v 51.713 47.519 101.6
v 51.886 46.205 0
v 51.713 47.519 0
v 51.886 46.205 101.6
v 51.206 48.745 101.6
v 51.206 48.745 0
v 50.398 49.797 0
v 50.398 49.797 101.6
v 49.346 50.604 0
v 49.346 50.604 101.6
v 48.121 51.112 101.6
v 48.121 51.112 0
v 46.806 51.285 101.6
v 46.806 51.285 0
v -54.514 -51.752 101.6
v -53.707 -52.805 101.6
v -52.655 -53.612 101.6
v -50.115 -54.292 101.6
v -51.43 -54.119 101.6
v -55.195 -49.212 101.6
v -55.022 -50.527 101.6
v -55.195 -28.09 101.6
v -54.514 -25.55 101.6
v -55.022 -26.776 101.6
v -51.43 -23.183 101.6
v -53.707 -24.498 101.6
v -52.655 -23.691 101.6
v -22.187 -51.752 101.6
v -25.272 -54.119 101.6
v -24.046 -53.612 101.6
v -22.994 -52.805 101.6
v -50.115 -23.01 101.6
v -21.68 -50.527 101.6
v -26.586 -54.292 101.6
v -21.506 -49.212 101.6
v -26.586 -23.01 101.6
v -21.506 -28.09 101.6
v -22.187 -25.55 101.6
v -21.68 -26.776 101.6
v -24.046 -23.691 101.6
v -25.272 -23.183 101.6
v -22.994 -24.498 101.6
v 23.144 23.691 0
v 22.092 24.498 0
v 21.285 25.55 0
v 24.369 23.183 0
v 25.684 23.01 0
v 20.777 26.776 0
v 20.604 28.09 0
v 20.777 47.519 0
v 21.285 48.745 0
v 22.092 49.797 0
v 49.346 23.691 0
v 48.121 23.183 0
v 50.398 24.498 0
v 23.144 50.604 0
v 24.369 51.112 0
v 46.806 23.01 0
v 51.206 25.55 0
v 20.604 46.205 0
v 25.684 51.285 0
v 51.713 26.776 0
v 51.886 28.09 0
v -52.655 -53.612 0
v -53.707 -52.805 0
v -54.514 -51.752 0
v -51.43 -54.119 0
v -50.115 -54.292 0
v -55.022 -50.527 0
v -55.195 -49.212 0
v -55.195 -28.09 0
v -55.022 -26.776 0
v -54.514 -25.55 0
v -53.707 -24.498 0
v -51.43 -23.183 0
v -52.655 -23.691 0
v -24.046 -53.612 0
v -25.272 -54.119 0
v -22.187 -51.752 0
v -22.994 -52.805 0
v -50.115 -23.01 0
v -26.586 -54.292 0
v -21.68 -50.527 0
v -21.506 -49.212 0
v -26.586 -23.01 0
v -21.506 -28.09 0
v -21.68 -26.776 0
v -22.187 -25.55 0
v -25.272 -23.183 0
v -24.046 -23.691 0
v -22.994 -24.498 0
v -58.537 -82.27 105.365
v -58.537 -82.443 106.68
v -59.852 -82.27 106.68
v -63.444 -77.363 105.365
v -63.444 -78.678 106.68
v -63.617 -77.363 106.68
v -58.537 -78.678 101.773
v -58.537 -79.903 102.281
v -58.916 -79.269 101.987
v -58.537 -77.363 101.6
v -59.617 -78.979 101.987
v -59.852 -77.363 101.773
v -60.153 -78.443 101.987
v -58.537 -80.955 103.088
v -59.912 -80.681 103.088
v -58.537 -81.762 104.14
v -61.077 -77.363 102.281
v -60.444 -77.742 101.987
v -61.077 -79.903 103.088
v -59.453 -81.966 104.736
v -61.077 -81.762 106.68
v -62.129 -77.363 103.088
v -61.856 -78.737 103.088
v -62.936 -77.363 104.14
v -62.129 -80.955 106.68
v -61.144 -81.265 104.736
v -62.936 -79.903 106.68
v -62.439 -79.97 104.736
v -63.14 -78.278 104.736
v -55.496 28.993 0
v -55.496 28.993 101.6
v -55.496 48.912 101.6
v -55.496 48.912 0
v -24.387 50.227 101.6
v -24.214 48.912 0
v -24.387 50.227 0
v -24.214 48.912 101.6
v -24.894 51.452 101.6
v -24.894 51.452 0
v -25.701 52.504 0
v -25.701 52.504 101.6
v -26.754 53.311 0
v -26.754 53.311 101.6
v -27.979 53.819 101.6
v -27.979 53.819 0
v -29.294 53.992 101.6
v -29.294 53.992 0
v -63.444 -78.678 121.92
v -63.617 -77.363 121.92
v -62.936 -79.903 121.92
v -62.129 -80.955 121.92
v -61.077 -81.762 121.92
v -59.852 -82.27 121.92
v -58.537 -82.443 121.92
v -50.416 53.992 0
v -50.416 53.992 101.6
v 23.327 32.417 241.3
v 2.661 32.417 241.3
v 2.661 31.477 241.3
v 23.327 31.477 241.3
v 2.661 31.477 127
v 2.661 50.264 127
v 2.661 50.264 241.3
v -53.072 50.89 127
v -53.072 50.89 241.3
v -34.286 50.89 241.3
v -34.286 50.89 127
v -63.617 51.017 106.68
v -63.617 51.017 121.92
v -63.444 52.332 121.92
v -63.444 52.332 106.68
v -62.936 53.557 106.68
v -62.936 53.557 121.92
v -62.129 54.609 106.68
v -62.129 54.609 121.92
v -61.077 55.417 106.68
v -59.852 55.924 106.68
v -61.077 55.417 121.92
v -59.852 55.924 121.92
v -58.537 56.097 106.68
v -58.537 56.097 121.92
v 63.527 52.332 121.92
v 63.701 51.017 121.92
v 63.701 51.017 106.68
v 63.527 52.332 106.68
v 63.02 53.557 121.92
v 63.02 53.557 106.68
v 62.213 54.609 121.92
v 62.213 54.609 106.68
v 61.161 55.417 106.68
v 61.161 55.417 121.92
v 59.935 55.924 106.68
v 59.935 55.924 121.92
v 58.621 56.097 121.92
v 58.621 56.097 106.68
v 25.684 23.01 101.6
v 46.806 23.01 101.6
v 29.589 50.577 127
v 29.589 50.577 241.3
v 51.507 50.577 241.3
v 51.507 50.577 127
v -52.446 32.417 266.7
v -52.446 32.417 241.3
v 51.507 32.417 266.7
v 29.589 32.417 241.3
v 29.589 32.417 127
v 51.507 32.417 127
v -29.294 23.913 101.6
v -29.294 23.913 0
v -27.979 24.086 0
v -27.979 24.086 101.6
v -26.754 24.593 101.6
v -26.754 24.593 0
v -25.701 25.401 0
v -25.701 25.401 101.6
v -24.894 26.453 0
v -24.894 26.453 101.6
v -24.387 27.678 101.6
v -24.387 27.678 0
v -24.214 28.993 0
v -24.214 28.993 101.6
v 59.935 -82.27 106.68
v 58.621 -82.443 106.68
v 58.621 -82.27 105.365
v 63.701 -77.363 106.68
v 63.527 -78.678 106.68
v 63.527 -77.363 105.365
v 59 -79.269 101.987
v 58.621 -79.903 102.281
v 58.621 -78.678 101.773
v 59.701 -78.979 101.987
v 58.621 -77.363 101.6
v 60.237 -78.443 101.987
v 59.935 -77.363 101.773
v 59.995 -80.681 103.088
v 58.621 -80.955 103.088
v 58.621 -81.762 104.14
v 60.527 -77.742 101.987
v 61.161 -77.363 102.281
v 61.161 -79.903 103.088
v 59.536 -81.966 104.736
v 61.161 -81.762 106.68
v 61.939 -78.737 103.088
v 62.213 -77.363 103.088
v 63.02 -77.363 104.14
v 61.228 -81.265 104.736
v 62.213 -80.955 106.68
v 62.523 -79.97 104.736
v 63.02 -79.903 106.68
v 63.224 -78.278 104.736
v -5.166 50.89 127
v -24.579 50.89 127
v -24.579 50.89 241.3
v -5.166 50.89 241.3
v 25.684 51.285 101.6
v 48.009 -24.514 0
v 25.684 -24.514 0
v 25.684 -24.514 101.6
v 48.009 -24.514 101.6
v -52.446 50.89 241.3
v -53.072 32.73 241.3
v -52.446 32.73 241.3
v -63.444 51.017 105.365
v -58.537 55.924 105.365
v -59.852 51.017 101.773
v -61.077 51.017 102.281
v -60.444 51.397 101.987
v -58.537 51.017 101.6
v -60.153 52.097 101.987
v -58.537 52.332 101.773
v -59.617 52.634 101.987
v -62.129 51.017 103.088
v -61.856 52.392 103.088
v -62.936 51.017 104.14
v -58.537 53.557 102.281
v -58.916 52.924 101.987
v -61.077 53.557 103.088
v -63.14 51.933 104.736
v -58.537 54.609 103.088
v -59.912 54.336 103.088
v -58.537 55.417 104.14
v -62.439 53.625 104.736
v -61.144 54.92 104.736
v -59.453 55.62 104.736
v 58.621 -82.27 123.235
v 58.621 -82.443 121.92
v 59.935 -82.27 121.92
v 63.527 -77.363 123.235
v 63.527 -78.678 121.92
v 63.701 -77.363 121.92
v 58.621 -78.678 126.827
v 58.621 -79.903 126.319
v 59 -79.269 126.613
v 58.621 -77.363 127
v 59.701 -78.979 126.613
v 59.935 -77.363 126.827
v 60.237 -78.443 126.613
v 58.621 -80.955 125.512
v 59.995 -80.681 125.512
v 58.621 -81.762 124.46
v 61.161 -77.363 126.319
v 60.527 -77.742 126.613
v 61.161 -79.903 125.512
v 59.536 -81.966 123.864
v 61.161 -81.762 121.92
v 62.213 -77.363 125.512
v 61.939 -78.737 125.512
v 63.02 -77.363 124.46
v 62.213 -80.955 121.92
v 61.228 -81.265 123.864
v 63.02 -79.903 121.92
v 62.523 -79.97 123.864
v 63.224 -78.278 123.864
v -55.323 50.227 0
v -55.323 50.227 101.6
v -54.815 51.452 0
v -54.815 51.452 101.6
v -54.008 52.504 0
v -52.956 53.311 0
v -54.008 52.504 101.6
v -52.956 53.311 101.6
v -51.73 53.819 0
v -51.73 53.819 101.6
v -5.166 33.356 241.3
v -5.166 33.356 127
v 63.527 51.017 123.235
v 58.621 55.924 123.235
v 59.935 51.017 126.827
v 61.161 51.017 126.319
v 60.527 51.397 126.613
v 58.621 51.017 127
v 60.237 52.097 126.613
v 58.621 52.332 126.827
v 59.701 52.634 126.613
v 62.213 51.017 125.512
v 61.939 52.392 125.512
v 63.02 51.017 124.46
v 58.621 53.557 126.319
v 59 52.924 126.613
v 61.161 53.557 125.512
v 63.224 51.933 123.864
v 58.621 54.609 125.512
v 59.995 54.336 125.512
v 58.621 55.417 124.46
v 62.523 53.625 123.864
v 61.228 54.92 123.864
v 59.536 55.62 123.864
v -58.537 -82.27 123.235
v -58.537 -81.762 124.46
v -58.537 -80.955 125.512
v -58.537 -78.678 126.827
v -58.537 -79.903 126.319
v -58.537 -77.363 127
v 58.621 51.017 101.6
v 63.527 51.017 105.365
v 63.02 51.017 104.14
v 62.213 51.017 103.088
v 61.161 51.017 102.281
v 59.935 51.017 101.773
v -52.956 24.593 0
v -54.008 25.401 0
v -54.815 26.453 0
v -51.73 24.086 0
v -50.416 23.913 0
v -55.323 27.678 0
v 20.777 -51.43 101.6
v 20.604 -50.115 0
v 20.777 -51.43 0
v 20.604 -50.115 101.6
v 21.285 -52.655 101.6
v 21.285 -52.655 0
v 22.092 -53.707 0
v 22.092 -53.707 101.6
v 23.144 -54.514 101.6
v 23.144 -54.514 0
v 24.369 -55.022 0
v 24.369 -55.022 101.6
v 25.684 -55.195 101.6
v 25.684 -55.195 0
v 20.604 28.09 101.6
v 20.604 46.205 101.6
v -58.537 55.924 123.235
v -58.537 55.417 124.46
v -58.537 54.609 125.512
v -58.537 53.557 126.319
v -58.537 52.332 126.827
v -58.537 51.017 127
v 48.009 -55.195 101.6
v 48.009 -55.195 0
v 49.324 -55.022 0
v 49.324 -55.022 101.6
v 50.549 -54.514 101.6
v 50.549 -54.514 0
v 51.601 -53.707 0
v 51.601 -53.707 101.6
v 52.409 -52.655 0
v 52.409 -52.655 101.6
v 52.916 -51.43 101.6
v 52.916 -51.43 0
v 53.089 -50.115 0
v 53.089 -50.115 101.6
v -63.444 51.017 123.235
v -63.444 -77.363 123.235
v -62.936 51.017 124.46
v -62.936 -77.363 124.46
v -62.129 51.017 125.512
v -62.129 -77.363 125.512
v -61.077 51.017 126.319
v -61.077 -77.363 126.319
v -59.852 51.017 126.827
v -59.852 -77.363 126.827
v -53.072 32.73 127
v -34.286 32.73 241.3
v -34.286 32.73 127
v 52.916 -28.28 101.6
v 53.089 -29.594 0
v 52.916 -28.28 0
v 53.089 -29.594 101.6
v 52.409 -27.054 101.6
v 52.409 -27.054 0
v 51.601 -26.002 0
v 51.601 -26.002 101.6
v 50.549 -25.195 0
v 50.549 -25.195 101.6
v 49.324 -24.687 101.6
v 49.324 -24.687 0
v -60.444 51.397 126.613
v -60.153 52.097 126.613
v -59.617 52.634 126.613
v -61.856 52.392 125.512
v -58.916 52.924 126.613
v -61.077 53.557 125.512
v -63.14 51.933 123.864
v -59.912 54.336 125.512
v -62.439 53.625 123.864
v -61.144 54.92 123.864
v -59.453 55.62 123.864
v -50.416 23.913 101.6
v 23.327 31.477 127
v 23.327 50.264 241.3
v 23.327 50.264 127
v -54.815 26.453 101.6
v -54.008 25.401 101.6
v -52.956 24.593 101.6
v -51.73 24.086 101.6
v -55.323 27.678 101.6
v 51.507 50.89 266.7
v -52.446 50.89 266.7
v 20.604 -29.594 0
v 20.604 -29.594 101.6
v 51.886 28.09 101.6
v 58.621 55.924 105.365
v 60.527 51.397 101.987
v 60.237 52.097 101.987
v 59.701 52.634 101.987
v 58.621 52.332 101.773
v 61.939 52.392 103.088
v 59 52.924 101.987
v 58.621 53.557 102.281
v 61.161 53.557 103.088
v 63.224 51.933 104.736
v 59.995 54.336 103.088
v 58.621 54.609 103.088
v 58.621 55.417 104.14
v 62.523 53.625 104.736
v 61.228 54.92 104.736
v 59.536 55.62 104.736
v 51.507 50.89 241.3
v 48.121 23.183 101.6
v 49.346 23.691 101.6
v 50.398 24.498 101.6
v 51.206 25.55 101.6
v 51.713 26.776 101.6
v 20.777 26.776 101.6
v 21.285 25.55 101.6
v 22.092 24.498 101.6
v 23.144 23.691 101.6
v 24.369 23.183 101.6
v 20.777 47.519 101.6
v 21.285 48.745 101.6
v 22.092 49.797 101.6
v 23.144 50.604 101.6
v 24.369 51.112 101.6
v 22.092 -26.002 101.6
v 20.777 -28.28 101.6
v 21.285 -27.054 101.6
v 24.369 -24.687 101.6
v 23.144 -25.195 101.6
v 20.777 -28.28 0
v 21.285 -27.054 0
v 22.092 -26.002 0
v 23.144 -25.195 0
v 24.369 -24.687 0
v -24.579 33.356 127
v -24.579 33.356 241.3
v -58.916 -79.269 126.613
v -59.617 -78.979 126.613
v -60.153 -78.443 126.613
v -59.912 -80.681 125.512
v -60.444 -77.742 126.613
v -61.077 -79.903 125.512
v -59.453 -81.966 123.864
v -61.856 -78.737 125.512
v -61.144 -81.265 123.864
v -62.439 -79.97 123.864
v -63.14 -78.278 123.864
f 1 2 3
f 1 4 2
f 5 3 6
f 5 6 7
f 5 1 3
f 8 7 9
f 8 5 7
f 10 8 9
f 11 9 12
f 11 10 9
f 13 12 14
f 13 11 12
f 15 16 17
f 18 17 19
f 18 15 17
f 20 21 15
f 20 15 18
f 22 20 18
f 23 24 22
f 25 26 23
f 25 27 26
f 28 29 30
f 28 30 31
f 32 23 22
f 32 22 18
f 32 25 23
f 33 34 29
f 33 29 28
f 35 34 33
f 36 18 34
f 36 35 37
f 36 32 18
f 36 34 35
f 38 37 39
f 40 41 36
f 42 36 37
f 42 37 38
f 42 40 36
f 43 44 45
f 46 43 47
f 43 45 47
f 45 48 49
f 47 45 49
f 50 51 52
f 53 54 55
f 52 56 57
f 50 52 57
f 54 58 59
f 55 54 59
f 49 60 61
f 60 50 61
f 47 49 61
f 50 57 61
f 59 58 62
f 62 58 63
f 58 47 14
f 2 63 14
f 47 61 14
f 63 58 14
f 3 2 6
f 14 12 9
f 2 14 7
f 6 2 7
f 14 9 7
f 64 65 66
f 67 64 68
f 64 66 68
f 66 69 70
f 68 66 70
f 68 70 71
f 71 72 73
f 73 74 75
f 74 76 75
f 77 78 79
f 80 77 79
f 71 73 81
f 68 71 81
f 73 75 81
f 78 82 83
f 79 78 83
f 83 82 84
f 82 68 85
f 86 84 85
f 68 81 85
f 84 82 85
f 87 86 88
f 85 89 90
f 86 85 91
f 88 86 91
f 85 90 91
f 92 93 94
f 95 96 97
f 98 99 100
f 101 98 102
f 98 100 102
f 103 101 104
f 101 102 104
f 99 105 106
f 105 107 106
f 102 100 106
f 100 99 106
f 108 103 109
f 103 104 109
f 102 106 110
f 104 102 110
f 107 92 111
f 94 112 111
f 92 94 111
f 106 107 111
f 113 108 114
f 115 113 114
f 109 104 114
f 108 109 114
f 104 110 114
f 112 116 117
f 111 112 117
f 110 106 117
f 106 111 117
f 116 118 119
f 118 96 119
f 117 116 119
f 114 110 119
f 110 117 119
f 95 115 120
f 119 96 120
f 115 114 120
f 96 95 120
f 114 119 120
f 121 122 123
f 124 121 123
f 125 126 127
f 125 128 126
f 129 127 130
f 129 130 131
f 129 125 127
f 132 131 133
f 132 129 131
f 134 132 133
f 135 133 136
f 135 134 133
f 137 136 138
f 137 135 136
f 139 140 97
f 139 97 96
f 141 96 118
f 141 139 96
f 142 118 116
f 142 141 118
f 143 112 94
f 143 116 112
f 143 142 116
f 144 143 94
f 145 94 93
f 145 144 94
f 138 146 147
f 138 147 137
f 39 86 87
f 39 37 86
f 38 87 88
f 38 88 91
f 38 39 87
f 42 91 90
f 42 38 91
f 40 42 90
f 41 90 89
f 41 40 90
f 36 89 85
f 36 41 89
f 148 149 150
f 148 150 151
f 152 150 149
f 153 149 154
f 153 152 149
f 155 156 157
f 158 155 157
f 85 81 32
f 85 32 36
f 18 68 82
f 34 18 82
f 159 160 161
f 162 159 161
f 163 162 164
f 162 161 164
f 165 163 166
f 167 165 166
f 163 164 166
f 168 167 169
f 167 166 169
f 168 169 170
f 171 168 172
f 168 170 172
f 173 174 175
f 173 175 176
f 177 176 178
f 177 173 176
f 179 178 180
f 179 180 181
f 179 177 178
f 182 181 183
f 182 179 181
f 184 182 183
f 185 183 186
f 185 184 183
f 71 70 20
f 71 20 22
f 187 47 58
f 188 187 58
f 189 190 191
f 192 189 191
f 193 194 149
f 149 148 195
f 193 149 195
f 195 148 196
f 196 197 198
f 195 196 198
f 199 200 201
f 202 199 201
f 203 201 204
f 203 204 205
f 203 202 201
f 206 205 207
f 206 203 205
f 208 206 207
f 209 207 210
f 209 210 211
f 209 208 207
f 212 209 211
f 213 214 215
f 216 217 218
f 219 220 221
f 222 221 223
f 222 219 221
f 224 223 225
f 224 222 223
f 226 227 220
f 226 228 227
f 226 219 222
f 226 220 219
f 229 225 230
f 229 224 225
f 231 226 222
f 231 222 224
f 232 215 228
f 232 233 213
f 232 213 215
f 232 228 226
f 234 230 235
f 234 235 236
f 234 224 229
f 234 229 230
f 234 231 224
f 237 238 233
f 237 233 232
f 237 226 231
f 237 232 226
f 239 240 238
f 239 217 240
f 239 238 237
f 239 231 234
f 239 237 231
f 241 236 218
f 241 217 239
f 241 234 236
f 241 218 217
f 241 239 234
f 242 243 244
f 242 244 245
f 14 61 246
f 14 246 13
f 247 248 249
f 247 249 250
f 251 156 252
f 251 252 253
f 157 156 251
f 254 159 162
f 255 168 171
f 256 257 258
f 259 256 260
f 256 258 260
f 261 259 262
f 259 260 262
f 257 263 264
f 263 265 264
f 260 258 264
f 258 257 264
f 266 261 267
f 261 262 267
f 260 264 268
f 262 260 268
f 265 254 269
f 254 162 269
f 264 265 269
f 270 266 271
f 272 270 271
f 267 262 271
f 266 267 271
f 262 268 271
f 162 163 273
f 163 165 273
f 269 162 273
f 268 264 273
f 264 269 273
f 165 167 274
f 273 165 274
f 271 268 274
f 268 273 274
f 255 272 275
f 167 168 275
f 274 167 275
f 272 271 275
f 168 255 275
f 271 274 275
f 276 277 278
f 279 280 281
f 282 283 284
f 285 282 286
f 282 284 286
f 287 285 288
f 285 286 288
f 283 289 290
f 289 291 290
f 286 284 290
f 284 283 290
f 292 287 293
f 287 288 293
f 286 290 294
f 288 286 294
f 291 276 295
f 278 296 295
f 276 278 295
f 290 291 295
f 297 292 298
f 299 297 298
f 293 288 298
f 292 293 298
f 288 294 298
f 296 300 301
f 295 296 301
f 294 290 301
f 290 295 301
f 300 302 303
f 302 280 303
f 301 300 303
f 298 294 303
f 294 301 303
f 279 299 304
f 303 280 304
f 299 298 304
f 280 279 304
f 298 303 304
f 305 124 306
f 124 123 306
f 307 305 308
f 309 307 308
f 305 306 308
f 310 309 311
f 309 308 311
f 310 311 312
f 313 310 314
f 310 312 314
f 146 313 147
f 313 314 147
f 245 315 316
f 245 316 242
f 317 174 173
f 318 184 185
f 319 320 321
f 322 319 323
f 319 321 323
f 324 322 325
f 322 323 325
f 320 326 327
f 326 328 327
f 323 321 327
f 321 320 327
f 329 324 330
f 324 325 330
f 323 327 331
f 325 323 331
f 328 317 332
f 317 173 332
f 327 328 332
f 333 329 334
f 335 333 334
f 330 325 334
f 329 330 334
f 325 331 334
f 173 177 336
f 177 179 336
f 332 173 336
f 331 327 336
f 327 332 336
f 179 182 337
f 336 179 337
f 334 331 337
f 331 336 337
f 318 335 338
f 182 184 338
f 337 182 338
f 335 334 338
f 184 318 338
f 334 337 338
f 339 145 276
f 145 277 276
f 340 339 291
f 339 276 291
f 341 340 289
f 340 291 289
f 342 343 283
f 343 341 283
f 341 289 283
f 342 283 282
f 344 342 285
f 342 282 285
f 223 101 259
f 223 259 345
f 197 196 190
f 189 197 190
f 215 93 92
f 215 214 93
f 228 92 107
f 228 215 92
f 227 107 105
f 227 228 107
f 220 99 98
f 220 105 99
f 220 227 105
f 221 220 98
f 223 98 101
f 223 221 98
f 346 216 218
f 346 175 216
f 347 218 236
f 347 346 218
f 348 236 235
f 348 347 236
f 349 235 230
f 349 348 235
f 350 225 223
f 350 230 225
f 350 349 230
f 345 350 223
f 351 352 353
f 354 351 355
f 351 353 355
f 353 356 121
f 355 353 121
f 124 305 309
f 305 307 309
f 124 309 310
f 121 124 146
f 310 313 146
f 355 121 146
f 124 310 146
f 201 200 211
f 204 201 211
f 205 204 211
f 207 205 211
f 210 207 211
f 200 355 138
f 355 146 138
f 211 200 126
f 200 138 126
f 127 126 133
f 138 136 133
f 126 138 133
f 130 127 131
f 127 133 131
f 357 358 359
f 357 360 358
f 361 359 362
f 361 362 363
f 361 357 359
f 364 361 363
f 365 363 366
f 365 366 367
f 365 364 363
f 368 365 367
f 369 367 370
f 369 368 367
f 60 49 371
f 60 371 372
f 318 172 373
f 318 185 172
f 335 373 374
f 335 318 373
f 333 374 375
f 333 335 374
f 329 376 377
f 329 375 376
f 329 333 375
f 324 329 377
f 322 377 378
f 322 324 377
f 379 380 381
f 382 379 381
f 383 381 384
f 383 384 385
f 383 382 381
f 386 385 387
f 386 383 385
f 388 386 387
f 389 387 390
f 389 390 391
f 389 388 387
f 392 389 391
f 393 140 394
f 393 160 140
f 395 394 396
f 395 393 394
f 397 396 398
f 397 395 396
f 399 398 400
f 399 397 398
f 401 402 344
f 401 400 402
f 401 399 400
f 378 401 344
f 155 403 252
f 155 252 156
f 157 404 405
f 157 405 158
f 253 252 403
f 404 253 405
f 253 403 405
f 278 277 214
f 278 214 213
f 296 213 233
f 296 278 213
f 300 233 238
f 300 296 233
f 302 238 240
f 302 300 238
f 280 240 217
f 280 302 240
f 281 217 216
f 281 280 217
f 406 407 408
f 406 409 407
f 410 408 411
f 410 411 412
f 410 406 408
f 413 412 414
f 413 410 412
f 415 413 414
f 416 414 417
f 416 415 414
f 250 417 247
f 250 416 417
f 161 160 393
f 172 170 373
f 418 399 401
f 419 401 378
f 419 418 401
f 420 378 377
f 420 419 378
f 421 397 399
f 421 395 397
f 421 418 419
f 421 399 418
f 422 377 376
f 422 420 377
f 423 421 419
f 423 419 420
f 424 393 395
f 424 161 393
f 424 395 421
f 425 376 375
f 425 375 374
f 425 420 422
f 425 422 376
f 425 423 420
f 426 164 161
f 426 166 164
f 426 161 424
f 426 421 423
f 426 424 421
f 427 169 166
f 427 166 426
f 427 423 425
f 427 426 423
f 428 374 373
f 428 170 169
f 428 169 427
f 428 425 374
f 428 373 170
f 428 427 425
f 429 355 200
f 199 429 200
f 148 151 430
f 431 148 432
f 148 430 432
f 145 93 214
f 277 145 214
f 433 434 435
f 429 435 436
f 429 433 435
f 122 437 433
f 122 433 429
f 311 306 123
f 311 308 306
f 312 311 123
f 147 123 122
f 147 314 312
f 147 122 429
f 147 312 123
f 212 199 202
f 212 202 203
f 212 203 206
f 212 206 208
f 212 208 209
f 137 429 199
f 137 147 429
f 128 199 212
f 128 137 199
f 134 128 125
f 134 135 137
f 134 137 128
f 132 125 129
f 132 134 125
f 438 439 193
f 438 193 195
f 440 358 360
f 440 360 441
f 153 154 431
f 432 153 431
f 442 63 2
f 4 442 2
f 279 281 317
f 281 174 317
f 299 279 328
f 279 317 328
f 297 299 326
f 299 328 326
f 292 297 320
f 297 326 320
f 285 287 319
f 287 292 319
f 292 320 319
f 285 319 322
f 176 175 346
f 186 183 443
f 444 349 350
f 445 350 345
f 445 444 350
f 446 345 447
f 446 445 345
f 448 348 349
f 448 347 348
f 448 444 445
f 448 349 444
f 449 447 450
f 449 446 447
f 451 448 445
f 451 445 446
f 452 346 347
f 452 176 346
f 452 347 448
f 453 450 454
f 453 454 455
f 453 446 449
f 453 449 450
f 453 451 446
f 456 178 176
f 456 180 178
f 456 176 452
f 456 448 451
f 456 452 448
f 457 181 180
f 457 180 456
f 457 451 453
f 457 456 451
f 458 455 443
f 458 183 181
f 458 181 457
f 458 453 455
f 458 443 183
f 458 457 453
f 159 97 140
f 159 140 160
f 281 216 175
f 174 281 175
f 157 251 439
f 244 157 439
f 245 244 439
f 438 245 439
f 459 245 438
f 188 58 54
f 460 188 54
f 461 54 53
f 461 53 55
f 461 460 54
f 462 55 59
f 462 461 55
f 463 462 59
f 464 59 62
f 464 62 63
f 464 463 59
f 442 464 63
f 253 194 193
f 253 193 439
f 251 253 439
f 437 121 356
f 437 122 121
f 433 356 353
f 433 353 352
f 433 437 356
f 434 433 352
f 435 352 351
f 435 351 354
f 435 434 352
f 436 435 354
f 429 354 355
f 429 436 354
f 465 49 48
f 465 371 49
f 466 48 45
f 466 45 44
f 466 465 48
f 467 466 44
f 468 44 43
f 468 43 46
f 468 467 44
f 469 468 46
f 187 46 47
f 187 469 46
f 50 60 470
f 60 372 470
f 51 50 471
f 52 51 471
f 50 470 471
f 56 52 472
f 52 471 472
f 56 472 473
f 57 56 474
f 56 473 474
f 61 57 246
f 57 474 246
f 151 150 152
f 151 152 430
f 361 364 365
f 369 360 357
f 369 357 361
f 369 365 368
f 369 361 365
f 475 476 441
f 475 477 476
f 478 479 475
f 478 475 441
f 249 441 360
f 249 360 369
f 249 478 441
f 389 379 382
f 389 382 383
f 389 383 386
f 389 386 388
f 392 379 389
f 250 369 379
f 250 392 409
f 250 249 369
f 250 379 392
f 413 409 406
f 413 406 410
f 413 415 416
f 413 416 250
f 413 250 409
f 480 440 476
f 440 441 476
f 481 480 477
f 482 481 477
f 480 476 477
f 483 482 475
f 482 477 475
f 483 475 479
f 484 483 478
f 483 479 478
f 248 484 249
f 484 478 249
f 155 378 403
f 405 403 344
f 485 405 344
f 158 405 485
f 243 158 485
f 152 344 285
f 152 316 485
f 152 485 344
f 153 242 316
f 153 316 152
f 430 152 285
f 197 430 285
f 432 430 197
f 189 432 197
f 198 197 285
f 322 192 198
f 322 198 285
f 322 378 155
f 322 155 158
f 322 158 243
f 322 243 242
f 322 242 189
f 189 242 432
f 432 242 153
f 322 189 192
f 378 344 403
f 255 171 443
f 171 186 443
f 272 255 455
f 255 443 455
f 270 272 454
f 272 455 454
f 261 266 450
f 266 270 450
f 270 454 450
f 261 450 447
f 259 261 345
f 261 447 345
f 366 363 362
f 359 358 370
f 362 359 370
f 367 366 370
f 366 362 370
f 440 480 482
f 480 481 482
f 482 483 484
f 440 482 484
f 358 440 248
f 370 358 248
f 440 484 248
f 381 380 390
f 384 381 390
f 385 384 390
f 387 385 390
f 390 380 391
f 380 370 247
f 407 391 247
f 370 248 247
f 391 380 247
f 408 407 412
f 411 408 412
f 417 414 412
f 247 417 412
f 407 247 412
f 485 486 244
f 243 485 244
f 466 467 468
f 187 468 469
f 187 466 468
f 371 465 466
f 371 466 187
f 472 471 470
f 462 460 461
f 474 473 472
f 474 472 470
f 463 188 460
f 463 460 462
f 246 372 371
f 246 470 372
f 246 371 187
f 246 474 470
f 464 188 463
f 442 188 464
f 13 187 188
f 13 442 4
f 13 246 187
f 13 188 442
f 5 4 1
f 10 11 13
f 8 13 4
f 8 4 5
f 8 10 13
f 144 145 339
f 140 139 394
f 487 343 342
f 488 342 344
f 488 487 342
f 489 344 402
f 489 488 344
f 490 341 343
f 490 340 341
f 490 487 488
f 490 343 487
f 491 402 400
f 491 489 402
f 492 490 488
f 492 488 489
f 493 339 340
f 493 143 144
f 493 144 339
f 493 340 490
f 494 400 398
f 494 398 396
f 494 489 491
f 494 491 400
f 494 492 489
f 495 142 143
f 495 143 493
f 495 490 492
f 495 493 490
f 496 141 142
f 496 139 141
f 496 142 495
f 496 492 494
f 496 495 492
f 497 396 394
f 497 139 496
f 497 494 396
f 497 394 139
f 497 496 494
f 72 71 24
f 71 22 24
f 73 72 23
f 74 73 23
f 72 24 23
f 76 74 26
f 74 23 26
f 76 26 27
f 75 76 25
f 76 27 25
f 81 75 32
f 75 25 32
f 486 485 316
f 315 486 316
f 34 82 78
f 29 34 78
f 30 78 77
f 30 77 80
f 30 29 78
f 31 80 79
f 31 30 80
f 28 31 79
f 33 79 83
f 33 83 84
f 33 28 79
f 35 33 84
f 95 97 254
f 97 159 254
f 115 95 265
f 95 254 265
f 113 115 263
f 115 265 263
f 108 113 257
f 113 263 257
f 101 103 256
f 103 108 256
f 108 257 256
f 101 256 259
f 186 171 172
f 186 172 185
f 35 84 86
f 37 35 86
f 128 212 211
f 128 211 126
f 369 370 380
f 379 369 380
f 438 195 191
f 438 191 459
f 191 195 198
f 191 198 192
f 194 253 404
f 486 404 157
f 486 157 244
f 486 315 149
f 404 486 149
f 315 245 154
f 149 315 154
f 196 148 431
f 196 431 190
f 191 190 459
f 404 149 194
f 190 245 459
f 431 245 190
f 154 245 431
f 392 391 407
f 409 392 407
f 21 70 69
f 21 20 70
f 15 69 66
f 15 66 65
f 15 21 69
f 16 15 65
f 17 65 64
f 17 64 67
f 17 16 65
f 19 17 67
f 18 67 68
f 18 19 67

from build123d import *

# Parameters (mm, degrees)
F0_W     = 31.282105
F0_H     = 30.078944
F0_W_2   = 31.282097
F0_H_2   = 28.274209
F0_W_3   = 33.688415
F0_H_3   = 31.282105
F0_W_4   = 32.485254
F0_H_4   = 30.68053
F1_DEPTH = 101.6
F2_W     = 127.317488
F2_H     = 138.53997
F3_DEPTH = 25.4
F4_R     = 5.08
F5_W     = 18.786639
F5_H     = 18.160425
F5_W_2   = 19.412856
F5_H_2   = 17.534204
F5_W_3   = 20.665298
F5_H_3   = 18.786639
F5_W_4   = 21.917746
F5_H_4   = 18.160418
F6_DEPTH = 114.3
F7_W     = 103.952736
F7_H     = 18.473532
F8_DEPTH = 25.4
F9_R     = 5.08
F10_R    = 5.08
F11_R    = 5.08
F12_R    = 5.08


with BuildPart() as f1:
    # F0 (on Top) → F1 (new body)
    with BuildSketch(Plane.XY):
        with Locations((-39.854604, 38.952235)):
            Rectangle(F0_W, F0_H)
        with Locations((36.245133, 37.147499)):
            Rectangle(F0_W_2, F0_H_2)
        with Locations((-38.350656, -38.651447)):
            Rectangle(F0_W_3, F0_H_3)
        with Locations((36.846712, -39.854605)):
            Rectangle(F0_W_4, F0_H_4)
    extrude(amount=F1_DEPTH)

    # F9
    f9_edges = [f1.edges().sort_by_distance(p)[0] for p in [
        (53.089339, -55.19487, 50.8),
        (53.089339, -24.51434, 50.8),
        (20.604085, -24.51434, 50.8),
        (20.604085, -55.19487, 50.8),
    ]]
    fillet(f9_edges, radius=F9_R)

    # F10
    f10_edges = [f1.edges().sort_by_distance(p)[0] for p in [
        (-55.194864, -54.2925, 50.8),
        (-55.194864, -23.010395, 50.8),
        (-21.506449, -54.2925, 50.8),
        (-21.506449, -23.010395, 50.8),
    ]]
    fillet(f10_edges, radius=F10_R)

    # F11
    f11_edges = [f1.edges().sort_by_distance(p)[0] for p in [
        (-55.495657, 53.991707, 50.8),
        (-55.495657, 23.912763, 50.8),
        (-24.213552, 53.991707, 50.8),
        (-24.213552, 23.912763, 50.8),
    ]]
    fillet(f11_edges, radius=F11_R)

    # F12
    f12_edges = [f1.edges().sort_by_distance(p)[0] for p in [
        (51.886182, 23.010395, 50.8),
        (51.886182, 51.284604, 50.8),
        (20.604085, 23.010395, 50.8),
        (20.604085, 51.284604, 50.8),
    ]]
    fillet(f12_edges, radius=F12_R)


with BuildPart() as f3:
    # F2 (on face) → F3 (new body)
    with BuildSketch(Plane.XY.offset(101.6)):
        with Locations((0.041768, -13.172746)):
            Rectangle(F2_W, F2_H)
    extrude(amount=F3_DEPTH)

    # F4
    f4_edges = [f3.edges().sort_by_distance(p)[0] for p in [
        (-63.616976, -82.442731, 114.3),
        (63.700512, -82.442731, 114.3),
        (0.041768, -82.442731, 101.6),
        (0.041768, -82.442731, 127),
        (-63.616976, 56.097239, 114.3),
        (-63.616976, -13.172746, 101.6),
        (-63.616976, -13.172746, 127),
        (63.700512, 56.097239, 114.3),
        (63.700512, -13.172746, 101.6),
        (63.700512, -13.172746, 127),
        (0.041768, 56.097239, 101.6),
        (0.041768, 56.097239, 127),
    ]]
    fillet(f4_edges, radius=F4_R)

    # F5 (on face) → F6 (join)
    with BuildSketch(Plane.XY.offset(127)):
        with Locations((-43.678935, 41.810018)):
            Rectangle(F5_W, F5_H)
        with Locations((-14.872756, 42.123128)):
            Rectangle(F5_W_2, F5_H_2)
        with Locations((12.994093, 40.870682)):
            Rectangle(F5_W_3, F5_H_3)
        with Locations((40.547829, 41.496903)):
            Rectangle(F5_W_4, F5_H_4)
    extrude(amount=F6_DEPTH)

    # F7 (on face) → F8 (join)
    with BuildSketch(Plane.XY.offset(241.3)):
        with Locations((-0.469666, 41.65346)):
            Rectangle(F7_W, F7_H)
    extrude(amount=F8_DEPTH)


solid = Compound([f1.part, f3.part])
